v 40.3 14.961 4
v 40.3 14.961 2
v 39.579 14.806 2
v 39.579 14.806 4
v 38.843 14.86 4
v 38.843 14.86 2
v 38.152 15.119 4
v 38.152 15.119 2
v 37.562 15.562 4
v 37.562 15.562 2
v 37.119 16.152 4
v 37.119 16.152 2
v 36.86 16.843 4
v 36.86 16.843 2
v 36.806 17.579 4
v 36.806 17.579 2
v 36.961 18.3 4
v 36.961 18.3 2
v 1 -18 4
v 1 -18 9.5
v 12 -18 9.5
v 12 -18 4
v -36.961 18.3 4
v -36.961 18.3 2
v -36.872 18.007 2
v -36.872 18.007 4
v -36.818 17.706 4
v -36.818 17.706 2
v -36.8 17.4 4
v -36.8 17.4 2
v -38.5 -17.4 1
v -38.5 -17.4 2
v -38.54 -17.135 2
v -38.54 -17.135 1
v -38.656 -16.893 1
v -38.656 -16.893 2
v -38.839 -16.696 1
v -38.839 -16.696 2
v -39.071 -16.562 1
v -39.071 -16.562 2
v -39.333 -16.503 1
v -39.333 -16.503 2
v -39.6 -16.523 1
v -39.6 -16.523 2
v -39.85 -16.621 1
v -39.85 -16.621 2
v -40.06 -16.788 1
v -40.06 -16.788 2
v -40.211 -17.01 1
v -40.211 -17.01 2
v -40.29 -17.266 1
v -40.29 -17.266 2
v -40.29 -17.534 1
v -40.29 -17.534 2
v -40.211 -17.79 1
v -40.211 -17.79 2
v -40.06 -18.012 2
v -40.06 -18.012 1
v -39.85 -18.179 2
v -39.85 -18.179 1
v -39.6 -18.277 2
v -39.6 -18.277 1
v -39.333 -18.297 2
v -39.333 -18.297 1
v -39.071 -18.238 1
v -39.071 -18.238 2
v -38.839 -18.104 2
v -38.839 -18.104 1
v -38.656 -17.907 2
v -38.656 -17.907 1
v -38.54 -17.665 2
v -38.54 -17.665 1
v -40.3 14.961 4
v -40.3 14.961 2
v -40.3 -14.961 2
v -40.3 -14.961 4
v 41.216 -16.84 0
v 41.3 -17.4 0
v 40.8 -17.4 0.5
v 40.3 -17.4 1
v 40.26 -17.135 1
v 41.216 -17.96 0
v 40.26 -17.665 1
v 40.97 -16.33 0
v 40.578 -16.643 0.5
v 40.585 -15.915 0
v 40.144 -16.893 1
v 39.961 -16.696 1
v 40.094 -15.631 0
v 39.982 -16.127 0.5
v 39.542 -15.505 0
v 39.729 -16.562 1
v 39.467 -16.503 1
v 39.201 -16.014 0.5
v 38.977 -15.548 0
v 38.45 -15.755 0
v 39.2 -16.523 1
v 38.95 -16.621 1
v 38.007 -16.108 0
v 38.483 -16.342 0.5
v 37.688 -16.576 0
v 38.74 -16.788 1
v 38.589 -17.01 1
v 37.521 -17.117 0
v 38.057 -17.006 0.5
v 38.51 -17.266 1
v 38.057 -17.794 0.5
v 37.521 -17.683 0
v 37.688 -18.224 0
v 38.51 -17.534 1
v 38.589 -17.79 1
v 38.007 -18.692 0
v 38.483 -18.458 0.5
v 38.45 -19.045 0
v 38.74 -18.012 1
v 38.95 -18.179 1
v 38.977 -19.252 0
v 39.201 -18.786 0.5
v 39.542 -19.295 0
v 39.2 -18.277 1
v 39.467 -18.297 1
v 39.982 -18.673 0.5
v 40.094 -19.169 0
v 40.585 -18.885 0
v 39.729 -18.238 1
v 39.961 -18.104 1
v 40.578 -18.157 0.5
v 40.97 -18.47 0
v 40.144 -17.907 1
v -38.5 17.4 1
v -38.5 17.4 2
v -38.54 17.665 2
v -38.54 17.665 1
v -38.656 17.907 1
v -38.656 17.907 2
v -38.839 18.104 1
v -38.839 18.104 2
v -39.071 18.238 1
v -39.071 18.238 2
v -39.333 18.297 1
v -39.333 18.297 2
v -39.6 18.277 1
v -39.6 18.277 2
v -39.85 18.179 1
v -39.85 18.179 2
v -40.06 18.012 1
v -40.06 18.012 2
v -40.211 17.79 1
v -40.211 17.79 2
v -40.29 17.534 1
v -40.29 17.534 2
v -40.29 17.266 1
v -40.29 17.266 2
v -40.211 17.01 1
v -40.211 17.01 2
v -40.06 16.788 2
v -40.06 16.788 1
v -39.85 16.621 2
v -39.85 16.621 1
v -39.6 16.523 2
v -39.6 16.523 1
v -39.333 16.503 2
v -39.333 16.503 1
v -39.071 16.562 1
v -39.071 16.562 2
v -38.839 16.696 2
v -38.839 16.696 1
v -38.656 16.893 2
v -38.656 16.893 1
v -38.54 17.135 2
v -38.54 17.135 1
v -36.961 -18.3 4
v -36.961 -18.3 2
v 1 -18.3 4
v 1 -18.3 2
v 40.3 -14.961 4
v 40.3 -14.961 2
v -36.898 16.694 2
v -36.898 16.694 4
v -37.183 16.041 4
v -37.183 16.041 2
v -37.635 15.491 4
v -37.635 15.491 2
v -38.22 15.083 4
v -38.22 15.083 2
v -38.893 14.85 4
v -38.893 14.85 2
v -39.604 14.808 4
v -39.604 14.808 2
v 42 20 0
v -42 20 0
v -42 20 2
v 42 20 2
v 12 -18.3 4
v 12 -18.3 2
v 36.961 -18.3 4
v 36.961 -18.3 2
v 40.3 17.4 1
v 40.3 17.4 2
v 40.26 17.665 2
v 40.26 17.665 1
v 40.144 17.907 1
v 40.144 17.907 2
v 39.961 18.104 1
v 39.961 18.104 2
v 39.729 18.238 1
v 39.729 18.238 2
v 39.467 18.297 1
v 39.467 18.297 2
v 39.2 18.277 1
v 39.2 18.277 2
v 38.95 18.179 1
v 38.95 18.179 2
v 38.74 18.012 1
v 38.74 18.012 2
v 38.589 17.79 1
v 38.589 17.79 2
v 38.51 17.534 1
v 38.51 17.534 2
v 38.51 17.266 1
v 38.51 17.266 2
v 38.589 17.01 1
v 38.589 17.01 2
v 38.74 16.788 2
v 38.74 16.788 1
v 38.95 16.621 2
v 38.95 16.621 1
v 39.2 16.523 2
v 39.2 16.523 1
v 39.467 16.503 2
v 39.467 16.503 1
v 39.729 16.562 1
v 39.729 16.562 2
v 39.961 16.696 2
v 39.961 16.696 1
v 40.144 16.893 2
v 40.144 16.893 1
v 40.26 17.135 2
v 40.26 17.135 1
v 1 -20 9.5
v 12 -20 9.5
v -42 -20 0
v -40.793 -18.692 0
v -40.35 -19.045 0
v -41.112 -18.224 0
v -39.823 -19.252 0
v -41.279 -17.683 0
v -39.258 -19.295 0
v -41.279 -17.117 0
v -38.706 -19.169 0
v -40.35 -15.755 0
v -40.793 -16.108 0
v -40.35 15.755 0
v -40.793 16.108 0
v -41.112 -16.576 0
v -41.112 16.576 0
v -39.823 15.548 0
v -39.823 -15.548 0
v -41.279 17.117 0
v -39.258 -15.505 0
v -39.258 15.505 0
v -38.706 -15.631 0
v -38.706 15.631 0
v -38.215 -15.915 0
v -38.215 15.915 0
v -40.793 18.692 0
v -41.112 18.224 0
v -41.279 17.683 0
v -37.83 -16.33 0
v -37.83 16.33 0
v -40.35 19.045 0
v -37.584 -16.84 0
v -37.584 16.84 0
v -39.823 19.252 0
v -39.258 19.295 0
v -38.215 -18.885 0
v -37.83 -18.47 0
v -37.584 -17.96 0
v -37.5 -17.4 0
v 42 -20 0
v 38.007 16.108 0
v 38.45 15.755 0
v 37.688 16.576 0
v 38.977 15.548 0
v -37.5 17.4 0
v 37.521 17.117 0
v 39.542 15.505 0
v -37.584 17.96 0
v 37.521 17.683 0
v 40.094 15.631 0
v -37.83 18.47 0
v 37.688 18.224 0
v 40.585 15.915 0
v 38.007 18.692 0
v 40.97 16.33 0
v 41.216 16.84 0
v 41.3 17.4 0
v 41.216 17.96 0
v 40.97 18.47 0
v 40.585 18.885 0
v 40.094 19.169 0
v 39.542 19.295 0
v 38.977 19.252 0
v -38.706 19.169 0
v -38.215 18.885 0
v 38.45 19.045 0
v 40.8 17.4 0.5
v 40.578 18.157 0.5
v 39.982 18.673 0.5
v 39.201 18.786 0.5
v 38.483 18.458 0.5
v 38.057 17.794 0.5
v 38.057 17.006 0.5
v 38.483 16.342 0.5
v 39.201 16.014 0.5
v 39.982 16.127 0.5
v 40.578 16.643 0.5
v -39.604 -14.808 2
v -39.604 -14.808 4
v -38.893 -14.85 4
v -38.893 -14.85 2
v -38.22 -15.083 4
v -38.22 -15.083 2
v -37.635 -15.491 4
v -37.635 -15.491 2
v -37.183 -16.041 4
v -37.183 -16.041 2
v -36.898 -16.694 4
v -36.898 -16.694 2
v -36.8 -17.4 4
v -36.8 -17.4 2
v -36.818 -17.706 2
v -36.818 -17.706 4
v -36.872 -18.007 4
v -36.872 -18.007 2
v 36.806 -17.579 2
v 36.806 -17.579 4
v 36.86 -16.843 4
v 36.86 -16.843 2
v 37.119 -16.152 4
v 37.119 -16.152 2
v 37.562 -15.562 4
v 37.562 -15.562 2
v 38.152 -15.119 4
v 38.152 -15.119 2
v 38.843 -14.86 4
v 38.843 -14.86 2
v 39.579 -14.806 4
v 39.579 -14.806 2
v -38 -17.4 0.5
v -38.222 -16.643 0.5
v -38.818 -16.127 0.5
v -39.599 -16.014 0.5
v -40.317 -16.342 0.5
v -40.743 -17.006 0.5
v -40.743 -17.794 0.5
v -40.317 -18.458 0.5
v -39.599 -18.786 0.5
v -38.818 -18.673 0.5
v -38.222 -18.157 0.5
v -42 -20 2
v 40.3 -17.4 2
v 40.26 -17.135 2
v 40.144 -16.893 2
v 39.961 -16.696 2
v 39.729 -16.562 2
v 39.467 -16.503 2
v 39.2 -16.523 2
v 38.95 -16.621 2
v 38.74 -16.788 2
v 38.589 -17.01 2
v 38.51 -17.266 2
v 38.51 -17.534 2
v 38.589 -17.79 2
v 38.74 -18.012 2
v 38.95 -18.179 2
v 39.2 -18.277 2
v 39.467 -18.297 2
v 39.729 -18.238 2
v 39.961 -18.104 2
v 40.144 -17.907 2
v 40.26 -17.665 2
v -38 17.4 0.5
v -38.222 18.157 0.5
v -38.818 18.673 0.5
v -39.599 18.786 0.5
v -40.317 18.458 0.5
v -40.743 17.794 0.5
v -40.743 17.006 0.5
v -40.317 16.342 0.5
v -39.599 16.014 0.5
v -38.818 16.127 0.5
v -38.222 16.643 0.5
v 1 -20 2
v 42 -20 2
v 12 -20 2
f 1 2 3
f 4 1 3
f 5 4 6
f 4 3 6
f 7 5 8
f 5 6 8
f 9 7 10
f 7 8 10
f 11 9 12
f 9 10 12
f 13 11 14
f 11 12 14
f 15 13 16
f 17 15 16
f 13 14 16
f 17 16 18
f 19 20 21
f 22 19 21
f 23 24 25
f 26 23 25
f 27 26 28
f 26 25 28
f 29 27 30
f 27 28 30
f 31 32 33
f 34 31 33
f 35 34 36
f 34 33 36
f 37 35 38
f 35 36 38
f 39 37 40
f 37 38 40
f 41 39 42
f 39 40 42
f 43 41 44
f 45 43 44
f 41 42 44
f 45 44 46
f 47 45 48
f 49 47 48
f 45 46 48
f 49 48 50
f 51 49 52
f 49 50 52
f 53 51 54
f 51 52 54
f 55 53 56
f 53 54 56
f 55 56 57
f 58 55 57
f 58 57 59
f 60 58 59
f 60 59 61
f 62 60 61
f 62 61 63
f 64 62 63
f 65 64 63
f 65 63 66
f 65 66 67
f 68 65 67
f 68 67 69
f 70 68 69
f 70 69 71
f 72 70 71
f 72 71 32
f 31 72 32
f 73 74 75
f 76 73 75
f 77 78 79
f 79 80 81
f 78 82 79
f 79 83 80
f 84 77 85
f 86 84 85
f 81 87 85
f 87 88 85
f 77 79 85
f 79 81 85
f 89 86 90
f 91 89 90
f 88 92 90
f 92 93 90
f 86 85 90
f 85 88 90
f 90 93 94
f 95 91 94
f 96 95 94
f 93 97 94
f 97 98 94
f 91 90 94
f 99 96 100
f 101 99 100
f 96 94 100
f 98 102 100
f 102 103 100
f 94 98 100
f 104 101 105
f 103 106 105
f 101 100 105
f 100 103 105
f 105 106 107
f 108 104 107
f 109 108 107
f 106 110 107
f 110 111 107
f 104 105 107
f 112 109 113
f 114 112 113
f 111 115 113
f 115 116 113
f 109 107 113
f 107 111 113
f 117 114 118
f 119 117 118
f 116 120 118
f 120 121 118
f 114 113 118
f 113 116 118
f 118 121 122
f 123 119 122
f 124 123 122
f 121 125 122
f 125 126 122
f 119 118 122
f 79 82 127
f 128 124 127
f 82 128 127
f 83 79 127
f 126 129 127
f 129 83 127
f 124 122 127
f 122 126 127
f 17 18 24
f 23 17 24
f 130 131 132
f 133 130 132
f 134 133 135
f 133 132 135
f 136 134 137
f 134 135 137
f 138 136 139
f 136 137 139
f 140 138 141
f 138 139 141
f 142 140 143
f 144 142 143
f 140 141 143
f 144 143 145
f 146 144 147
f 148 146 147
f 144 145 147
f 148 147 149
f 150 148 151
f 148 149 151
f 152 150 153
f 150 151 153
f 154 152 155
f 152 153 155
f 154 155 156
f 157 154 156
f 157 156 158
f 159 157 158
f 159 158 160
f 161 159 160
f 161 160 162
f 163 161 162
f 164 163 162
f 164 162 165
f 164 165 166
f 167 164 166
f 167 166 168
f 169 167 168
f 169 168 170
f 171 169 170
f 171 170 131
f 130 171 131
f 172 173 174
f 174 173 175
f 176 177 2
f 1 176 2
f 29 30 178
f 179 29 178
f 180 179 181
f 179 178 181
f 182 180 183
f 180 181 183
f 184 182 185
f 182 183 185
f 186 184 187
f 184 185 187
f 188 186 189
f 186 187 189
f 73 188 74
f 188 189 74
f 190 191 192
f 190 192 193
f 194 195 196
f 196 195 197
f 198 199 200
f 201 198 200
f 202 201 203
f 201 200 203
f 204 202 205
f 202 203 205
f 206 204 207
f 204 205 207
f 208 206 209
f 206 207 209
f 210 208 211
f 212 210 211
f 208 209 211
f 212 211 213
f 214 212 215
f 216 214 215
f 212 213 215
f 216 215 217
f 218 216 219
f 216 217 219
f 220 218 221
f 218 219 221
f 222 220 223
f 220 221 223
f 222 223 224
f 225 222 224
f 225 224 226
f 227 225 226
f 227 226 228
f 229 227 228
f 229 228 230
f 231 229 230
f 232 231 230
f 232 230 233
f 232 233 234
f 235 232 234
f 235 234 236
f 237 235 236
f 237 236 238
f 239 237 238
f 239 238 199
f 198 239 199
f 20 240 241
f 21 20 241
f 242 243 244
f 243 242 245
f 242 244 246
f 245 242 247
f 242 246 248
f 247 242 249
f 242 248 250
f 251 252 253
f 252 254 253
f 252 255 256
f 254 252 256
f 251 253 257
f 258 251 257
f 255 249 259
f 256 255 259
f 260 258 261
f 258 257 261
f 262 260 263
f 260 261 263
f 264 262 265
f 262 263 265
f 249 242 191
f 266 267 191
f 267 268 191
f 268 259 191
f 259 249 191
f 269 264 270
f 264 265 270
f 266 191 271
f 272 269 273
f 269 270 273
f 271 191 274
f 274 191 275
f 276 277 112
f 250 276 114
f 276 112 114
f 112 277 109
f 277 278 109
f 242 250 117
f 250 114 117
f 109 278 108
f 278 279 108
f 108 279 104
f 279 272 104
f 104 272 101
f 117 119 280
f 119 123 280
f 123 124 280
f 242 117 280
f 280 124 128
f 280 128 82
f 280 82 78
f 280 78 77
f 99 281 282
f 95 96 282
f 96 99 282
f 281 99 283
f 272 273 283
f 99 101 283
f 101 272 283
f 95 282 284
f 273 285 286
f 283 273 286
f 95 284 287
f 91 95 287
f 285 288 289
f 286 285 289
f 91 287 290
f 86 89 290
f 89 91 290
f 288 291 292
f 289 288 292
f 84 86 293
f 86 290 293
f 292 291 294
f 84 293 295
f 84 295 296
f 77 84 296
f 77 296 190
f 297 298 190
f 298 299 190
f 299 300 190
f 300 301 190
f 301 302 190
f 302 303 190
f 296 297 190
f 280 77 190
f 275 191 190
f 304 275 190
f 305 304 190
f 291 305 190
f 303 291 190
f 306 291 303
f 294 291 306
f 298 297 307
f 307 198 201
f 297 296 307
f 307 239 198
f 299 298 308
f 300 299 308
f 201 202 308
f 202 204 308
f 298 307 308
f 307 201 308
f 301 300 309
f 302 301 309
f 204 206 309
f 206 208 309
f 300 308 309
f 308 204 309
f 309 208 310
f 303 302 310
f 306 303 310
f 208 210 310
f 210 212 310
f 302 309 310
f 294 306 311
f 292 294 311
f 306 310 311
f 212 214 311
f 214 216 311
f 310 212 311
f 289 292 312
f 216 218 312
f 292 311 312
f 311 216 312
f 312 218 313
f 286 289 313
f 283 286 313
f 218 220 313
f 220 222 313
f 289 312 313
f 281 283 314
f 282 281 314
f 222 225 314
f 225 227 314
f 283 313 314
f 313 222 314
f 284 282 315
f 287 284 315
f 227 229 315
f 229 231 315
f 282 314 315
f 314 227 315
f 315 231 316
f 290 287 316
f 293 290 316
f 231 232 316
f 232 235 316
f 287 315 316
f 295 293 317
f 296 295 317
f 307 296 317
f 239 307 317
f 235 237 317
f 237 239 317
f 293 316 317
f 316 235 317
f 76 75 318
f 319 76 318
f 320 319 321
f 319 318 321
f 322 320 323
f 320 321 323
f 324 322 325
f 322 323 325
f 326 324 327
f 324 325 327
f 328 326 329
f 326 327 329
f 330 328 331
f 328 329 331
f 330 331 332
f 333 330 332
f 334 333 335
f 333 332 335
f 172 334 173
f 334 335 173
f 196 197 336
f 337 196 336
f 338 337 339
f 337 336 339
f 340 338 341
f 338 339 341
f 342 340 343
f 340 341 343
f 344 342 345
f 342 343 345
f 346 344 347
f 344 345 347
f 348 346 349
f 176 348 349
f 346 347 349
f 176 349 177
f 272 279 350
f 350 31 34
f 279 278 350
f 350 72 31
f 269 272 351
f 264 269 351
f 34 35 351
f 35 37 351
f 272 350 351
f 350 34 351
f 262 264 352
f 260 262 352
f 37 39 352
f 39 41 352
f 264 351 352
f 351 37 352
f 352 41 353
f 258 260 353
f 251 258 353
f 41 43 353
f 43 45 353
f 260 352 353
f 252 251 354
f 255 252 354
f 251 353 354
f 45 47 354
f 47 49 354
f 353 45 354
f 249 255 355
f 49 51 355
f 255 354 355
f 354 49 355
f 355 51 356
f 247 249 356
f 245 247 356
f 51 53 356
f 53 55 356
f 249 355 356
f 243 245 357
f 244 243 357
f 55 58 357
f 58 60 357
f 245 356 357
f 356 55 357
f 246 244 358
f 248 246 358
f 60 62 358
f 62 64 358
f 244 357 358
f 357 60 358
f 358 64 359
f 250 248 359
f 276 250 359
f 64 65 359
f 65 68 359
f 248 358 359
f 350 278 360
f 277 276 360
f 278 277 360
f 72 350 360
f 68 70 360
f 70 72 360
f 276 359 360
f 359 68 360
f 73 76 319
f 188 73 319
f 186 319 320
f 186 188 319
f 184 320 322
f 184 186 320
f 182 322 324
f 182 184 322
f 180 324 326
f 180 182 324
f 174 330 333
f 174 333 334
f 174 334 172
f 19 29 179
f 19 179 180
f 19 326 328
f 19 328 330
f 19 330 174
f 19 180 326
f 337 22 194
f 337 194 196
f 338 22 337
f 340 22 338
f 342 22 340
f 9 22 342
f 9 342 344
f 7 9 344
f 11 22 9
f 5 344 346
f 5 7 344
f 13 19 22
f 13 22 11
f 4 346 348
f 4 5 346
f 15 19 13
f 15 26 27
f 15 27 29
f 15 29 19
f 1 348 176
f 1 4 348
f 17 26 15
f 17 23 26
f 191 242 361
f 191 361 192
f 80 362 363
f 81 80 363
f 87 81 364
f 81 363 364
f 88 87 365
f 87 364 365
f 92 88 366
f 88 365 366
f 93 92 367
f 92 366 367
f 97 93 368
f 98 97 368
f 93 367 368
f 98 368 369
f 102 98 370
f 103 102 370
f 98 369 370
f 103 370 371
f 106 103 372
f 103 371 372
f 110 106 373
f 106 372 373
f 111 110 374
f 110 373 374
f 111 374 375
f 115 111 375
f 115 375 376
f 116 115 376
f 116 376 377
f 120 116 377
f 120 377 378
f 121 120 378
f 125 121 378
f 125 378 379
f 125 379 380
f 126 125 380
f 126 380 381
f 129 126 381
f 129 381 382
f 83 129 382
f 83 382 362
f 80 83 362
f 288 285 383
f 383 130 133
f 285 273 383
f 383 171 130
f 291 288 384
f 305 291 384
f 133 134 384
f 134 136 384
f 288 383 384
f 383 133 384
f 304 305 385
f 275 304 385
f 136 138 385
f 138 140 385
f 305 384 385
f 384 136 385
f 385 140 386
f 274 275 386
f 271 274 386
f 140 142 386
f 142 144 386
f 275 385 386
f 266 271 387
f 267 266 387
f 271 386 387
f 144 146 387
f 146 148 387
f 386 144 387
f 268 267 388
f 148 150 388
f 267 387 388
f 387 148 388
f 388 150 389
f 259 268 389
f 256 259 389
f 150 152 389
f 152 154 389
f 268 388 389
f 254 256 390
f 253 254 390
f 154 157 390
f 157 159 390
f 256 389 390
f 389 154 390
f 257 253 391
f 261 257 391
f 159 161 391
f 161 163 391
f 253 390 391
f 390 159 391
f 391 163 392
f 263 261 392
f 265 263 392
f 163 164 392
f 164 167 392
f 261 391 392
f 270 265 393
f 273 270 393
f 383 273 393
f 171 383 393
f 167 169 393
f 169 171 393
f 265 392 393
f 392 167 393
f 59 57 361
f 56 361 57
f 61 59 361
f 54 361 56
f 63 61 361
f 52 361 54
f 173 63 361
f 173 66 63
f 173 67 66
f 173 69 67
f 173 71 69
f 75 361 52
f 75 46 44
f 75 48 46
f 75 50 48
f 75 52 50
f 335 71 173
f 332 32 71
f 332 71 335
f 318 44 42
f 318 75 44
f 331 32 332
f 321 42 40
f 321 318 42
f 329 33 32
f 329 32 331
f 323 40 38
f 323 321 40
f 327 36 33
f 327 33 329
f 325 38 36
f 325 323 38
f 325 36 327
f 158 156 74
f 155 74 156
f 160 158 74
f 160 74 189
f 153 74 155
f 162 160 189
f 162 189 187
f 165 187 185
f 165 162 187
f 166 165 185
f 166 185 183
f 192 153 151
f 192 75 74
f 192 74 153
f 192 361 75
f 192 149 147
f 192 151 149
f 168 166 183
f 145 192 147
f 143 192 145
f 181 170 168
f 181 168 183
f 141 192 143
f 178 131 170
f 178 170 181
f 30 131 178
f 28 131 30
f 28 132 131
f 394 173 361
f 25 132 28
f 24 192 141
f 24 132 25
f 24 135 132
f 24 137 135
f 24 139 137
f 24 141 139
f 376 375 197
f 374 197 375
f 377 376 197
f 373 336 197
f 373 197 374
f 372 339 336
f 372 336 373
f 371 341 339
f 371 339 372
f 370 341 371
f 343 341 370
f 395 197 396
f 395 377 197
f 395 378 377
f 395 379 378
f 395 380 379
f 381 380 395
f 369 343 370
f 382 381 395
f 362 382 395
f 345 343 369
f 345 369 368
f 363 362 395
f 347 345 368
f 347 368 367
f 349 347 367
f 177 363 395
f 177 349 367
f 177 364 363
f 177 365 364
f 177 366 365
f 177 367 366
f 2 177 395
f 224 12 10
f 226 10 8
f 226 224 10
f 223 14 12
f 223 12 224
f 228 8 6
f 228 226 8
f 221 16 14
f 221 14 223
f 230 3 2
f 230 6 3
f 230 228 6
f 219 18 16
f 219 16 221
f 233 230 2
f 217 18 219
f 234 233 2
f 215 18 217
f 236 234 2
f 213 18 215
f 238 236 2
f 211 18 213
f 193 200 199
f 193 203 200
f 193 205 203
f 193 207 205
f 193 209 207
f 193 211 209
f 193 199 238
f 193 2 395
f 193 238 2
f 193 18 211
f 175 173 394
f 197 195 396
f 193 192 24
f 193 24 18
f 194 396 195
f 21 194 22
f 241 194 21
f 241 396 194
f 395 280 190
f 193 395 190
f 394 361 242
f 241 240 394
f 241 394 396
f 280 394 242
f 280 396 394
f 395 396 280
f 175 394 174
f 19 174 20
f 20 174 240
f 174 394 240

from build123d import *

# Parameters (mm, degrees)
F0_W     = 84
F0_H     = 40
F1_DEPTH = 2
F3_DEPTH = 2
F4_R     = 0.9
F6_DEPTH = 2.001
F7_SIZE  = 1
F5_W     = 11
F5_H     = 7.5
F8_DEPTH = 2


with BuildPart() as f1:
    # F0 (on Top) → F1 (new body)
    with BuildSketch(Plane.XY):
        Rectangle(F0_W, F0_H)
    extrude(amount=F1_DEPTH)

    # F2 (on face) → F3 (join)
    with BuildSketch(Plane.XY.offset(2)):
        with BuildLine():
            Line((-36.9607378165, -18.3), (36.9607378165, -18.3))
            ThreePointArc((36.9607378165, -18.3), (37.5615223689, -15.5615223689), (40.3, -14.9607378165))
            Line((40.3, -14.9607378165), (40.3, 14.9607378165))
            ThreePointArc((40.3, 14.9607378165), (37.5615223689, 15.5615223689), (36.9607378165, 18.3))
            Line((36.9607378165, 18.3), (-36.9607378165, 18.3))
            ThreePointArc((-36.9607378165, 18.3), (-36.840499885, 17.8571205108), (-36.8, 17.4))
            ThreePointArc((-36.8, 17.4), (-37.9133931253, 15.2669270992), (-40.3, 14.9607378165))
            Line((-40.3, 14.9607378165), (-40.3, -14.9607378165))
            ThreePointArc((-40.3, -14.9607378165), (-37.9133931253, -15.2669270992), (-36.8, -17.4))
            ThreePointArc((-36.8, -17.4), (-36.840499885, -17.8571205108), (-36.9607378165, -18.3))
        make_face()
    extrude(amount=F3_DEPTH)

    # F4 (on face) → F6 (cut, through all)
    with BuildSketch(Plane.XY.offset(2)):
        with Locations((-39.4, 17.4)):
            Circle(F4_R)
        with Locations((-39.4, -17.4)):
            Circle(F4_R)
        with Locations((39.4, -17.4)):
            Circle(F4_R)
        with Locations((39.4, 17.4)):
            Circle(F4_R)
    extrude(amount=-F6_DEPTH, mode=Mode.SUBTRACT)

    # F7
    f7_edges = [f1.edges().sort_by_distance(p)[0] for p in [
        (-40.3, 17.4, 0),
        (-40.3, -17.4, 0),
        (38.5, -17.4, 0),
        (38.5, 17.4, 0),
    ]]
    chamfer(f7_edges, length=F7_SIZE)

    # F5 (on face) → F8 (join)
    with BuildSketch(Plane.XZ.offset(20)):
        with Locations((6.5, 5.75)):
            Rectangle(F5_W, F5_H)
    extrude(amount=-F8_DEPTH)


solid = f1.part
